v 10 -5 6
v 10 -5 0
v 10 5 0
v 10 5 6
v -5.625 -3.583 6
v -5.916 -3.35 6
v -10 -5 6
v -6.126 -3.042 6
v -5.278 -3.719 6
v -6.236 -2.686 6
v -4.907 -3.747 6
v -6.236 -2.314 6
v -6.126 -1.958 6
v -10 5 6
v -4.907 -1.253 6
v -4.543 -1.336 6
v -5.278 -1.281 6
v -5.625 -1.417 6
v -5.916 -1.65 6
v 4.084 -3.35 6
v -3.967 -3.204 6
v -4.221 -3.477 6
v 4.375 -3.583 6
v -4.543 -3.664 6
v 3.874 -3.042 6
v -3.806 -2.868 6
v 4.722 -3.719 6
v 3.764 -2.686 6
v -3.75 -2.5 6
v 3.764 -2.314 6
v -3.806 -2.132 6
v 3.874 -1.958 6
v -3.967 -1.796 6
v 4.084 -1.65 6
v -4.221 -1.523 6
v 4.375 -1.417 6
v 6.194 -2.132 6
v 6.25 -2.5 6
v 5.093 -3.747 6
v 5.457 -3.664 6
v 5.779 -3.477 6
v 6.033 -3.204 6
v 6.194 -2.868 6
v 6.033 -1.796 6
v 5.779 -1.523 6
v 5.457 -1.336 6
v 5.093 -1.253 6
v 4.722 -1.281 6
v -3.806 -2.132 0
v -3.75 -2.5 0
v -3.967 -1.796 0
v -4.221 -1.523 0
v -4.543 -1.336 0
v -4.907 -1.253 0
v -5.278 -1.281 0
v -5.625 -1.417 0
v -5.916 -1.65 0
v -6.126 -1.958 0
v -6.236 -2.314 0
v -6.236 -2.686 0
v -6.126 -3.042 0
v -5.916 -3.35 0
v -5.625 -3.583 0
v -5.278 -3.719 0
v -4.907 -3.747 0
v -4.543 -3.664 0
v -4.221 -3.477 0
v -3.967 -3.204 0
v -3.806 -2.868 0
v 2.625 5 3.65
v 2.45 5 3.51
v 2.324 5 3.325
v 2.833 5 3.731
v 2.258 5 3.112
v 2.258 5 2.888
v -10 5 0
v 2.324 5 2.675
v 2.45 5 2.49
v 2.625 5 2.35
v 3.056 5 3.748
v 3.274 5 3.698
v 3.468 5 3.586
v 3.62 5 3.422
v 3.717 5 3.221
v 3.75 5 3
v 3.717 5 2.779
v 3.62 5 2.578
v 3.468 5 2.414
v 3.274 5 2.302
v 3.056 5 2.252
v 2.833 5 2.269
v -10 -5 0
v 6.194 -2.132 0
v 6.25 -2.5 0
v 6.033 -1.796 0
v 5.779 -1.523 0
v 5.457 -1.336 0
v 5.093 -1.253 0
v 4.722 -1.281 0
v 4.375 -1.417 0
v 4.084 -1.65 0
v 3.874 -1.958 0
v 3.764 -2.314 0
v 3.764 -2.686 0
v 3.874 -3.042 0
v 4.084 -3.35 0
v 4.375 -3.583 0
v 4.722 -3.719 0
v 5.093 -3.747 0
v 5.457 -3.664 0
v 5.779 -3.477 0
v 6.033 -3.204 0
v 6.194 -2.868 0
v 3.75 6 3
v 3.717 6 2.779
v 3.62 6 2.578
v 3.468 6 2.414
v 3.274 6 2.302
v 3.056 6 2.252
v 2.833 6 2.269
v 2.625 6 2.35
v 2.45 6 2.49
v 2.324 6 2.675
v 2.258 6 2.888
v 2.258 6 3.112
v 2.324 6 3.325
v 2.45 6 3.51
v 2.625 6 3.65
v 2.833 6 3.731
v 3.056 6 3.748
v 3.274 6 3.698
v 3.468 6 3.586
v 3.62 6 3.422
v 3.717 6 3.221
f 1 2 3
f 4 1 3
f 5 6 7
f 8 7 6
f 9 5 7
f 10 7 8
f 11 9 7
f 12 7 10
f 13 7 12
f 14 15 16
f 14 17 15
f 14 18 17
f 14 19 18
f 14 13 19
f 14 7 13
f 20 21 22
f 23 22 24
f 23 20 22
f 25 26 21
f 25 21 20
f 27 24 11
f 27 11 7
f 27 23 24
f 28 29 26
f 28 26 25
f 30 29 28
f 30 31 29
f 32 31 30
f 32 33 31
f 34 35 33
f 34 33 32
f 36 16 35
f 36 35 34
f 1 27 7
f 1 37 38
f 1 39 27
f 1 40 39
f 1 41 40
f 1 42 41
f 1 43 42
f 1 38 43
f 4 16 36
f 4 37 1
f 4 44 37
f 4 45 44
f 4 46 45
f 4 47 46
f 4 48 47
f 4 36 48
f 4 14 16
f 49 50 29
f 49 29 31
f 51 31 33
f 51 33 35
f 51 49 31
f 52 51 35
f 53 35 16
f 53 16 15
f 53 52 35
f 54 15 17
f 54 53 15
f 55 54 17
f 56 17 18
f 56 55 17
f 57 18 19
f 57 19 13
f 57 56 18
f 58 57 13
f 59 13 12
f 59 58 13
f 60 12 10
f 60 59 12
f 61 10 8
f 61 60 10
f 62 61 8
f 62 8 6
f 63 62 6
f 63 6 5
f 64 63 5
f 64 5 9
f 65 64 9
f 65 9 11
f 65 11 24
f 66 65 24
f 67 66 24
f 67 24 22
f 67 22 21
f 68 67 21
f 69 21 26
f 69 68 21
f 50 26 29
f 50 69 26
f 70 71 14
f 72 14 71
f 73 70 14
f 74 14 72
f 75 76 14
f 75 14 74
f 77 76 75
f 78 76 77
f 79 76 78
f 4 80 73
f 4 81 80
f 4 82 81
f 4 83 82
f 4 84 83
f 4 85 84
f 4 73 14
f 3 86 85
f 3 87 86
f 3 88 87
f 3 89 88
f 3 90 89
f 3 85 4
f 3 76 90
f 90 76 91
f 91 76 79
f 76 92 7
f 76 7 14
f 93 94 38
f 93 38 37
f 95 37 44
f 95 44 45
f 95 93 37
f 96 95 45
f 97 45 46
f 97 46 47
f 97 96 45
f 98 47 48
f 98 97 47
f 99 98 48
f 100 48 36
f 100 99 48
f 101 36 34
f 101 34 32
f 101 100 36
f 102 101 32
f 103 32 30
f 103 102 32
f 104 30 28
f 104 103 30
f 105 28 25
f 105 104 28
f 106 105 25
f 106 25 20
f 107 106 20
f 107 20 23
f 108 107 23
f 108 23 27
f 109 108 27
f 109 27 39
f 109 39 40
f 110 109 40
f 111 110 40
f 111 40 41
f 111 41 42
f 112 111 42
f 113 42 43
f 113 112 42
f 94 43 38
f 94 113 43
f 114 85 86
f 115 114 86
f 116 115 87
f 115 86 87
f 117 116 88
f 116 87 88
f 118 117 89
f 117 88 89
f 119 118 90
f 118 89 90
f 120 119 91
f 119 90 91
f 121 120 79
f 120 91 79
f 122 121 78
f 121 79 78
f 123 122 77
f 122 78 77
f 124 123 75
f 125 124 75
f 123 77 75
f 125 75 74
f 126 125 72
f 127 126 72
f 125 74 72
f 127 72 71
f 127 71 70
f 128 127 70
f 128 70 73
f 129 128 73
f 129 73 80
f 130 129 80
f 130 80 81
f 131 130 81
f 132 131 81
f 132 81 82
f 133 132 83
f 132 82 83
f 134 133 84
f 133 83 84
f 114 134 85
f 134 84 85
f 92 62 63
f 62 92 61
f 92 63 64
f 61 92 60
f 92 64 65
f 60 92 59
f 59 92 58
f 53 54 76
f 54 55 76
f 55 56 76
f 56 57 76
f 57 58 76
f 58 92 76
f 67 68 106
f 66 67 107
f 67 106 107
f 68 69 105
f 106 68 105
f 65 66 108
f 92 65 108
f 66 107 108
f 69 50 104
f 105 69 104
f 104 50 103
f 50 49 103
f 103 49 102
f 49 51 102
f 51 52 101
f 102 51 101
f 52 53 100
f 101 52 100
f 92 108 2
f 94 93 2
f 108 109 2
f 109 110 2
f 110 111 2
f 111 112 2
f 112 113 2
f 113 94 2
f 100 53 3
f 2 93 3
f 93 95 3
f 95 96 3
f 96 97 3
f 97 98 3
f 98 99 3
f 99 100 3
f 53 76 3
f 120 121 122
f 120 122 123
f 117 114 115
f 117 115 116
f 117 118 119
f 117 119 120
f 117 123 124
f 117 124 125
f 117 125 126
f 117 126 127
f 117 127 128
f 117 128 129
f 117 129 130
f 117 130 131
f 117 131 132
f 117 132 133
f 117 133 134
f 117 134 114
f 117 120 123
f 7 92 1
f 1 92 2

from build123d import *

# Parameters (mm, degrees)
SKETCH1_W           = 20
SKETCH1_H           = 10
SKETCH1_R           = 1.25
BOSS_EXTRUDE1_DEPTH = 6
SKETCH2_R           = 0.75
BOSS_EXTRUDE2_DEPTH = 1


with BuildPart() as part:
    # Sketch1 → Boss-Extrude1 (new body)
    with BuildSketch(Plane.XY):
        Rectangle(SKETCH1_W, SKETCH1_H)
        with Locations((-5, -2.5)):
            Circle(SKETCH1_R, mode=Mode.SUBTRACT)
        with Locations((5, -2.5)):
            Circle(SKETCH1_R, mode=Mode.SUBTRACT)
    extrude(amount=BOSS_EXTRUDE1_DEPTH)

    # Sketch2 → Boss-Extrude2 (add)
    with BuildSketch(Plane(origin=(0, 5, 0), x_dir=(1, 0, 0), z_dir=(0, 1, 0))):
        with Locations((3, -3)):
            Circle(SKETCH2_R)
    extrude(amount=BOSS_EXTRUDE2_DEPTH)


solid = part.part
